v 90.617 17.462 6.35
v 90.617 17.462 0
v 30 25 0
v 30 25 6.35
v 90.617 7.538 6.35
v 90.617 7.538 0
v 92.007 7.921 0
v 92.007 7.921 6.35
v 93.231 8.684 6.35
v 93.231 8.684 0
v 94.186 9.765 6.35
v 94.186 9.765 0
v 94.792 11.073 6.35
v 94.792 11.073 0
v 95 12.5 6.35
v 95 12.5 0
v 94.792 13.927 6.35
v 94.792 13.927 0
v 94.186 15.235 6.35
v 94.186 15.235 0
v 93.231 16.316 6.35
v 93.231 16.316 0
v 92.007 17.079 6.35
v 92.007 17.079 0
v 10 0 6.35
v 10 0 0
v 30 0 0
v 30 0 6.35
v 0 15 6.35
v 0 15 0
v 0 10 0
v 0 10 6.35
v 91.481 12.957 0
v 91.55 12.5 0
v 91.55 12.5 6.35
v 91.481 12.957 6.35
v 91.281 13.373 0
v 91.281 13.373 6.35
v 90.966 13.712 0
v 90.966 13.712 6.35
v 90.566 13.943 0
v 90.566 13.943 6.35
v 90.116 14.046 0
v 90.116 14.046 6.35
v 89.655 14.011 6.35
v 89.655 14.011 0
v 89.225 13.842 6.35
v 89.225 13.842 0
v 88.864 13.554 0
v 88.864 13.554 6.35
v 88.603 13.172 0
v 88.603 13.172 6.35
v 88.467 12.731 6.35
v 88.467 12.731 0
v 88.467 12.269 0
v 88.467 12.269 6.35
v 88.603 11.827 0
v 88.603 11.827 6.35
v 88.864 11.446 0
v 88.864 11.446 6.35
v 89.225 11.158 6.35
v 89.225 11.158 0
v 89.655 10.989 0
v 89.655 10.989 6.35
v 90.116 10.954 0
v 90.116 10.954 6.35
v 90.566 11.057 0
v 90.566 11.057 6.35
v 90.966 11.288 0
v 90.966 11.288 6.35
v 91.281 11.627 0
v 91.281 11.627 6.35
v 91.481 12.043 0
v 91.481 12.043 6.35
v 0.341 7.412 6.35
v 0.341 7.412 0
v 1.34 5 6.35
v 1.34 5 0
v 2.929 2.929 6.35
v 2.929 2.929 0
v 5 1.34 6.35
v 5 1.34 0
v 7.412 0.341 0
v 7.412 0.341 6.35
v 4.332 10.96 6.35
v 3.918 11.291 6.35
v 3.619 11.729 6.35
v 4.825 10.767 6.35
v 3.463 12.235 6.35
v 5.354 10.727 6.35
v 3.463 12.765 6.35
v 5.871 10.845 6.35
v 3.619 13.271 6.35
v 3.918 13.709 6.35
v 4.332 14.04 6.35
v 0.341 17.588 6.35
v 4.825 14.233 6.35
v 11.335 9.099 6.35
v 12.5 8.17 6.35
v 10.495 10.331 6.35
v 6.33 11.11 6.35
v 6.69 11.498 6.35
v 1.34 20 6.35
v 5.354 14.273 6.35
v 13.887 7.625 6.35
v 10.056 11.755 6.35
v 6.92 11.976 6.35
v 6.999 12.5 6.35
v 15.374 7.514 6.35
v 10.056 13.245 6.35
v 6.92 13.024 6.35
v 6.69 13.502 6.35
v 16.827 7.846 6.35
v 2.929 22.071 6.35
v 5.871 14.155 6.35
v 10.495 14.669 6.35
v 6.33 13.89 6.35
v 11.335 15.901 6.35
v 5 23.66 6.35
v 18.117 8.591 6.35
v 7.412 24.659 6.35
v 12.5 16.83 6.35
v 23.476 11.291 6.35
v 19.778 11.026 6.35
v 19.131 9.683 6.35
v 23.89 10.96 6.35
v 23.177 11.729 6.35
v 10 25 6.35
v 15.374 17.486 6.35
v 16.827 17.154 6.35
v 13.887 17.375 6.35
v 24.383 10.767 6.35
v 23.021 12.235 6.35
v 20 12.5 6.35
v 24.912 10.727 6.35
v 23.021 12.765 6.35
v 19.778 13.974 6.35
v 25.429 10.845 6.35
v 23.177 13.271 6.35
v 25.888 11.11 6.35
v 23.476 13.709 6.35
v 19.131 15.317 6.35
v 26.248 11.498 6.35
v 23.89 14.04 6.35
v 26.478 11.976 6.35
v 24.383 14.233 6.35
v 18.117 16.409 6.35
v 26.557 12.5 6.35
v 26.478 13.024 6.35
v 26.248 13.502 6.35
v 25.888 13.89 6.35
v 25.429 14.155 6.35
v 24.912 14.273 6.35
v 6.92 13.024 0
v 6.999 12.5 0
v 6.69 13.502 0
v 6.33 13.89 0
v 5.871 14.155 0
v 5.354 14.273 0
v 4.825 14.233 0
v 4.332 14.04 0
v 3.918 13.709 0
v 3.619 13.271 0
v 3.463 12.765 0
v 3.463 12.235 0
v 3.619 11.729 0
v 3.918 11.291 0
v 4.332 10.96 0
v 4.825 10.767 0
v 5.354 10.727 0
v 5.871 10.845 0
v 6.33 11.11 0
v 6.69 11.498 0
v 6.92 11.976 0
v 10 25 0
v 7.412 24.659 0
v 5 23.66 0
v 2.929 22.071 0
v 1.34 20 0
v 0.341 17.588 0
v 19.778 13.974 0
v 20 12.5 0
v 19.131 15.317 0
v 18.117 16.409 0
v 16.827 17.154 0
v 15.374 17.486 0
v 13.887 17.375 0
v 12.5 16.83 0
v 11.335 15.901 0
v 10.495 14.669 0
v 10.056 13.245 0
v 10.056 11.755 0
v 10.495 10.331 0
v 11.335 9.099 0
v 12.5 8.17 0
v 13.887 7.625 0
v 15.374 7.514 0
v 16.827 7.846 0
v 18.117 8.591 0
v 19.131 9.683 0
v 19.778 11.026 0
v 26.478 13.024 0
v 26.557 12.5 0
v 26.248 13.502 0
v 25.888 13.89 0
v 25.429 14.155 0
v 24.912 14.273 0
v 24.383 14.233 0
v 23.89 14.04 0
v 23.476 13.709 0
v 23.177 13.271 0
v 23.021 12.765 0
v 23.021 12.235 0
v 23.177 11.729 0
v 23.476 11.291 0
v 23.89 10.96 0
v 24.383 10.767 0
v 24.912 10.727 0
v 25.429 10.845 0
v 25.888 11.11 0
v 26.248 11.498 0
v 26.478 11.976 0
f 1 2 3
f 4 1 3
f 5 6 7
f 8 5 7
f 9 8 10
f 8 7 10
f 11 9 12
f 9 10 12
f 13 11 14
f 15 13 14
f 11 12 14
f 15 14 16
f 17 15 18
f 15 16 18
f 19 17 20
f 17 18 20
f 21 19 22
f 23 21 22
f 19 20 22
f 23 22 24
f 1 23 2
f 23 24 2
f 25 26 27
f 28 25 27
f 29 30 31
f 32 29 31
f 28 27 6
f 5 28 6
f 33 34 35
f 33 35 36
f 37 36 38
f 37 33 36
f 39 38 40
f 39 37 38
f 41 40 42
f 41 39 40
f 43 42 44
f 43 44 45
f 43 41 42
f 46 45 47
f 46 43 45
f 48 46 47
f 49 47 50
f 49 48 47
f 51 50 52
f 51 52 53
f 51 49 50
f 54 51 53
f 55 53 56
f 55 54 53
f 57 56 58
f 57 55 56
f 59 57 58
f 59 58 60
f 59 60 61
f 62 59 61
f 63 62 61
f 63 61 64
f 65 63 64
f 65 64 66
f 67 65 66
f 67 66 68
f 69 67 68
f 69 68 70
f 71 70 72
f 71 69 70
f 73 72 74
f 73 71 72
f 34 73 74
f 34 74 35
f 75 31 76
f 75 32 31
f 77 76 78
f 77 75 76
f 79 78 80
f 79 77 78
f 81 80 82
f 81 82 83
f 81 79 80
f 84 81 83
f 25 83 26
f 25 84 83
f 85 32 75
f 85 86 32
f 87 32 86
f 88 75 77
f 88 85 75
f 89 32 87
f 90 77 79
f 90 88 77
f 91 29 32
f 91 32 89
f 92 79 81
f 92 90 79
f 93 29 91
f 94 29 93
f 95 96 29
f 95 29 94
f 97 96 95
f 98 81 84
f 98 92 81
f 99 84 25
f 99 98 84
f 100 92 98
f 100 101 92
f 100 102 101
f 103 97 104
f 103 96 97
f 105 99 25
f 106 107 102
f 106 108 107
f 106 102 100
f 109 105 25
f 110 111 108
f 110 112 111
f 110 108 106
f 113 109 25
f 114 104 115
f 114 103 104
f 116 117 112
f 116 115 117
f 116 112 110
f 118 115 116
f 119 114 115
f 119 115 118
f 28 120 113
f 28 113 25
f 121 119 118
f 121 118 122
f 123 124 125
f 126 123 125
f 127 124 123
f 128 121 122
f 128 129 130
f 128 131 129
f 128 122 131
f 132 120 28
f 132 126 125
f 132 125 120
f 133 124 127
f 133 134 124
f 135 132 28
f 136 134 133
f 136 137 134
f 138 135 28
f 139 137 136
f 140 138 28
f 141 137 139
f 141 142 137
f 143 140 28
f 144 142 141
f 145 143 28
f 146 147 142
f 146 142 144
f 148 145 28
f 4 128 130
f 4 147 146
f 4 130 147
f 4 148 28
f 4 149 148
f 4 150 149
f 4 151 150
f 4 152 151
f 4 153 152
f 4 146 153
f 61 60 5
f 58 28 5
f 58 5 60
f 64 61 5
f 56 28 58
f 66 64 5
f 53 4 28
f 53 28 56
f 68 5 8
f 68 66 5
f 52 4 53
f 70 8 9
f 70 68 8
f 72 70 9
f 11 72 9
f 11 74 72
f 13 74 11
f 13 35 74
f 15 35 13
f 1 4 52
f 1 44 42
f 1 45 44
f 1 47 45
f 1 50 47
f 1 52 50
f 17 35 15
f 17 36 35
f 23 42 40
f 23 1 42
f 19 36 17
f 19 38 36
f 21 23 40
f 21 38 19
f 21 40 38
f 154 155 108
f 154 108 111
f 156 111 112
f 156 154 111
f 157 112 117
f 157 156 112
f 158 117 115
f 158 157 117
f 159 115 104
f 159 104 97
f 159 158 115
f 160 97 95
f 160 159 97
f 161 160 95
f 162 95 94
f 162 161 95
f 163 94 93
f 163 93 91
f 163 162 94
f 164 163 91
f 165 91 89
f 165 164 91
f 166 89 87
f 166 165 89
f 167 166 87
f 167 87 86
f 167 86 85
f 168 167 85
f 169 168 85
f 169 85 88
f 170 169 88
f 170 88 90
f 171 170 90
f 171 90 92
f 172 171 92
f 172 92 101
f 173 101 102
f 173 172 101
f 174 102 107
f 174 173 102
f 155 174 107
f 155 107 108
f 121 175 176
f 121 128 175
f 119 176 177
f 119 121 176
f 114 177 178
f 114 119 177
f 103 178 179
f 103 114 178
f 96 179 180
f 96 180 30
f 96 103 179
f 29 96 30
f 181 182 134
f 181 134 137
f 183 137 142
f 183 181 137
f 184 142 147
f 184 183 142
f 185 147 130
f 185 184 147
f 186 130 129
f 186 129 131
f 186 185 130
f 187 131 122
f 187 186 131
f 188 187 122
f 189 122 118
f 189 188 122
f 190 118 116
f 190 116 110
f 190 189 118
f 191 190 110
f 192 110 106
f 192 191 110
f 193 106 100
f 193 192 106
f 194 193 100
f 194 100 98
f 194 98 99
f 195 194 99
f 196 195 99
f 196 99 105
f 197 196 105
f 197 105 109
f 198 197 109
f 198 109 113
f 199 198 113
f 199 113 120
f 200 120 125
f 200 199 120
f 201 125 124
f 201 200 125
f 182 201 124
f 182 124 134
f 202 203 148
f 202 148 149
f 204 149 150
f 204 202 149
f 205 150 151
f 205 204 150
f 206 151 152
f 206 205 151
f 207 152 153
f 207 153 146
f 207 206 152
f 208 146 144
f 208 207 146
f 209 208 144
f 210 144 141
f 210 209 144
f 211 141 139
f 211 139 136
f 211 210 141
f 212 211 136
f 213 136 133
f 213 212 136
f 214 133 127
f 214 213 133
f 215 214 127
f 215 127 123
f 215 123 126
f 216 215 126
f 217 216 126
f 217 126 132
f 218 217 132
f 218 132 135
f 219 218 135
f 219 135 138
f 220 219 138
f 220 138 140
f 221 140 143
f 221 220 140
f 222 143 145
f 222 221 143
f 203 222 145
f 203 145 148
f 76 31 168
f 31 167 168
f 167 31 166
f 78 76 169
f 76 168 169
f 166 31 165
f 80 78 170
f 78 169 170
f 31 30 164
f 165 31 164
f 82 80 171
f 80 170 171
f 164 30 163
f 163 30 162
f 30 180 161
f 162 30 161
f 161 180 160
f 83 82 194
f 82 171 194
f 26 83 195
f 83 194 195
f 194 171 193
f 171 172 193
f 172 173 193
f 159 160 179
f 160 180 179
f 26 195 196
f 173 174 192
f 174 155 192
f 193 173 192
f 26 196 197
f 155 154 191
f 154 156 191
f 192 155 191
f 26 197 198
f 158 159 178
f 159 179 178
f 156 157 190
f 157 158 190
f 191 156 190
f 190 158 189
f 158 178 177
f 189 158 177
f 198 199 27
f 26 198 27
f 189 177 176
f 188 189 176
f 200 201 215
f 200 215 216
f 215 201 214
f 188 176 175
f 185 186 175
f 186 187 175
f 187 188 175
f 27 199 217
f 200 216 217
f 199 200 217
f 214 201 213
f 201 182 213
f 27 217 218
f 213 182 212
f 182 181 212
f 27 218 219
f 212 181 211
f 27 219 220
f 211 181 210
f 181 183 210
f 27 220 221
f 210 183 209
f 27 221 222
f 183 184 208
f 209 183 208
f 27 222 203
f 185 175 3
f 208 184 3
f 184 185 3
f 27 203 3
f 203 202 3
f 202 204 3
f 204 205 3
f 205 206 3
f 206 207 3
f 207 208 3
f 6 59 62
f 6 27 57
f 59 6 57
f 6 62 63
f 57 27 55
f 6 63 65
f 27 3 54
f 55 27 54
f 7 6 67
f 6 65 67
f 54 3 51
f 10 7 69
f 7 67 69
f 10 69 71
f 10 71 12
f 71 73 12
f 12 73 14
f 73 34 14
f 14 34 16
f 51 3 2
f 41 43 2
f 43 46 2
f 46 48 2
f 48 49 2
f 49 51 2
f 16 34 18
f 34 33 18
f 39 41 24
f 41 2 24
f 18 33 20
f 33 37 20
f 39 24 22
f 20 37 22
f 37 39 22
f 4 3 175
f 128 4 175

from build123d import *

# Parameters (mm, degrees)
SKETCH1_R           = 1.778
SKETCH1_R_2         = 1.55
SKETCH1_R_3         = 5
BOSS_EXTRUDE1_DEPTH = 6.35
FILLET1_R           = 10


with BuildPart() as part:
    # Sketch1 → Boss-Extrude1 (new body)
    with BuildSketch(Plane.XY):
        with BuildLine():
            Line((90.617041925, 17.461725961), (30, 25))
            Line((30, 25), (0, 25))
            Line((0, 25), (0, 0))
            Line((0, 0), (30, 0))
            Line((30, 0), (90.617033237, 7.538165184))
            ThreePointArc((90.617033237, 7.538165184), (95, 12.499941736), (90.617041925, 17.461725961))
        make_face()
        with Locations((24.779, 12.499946113)):
            Circle(SKETCH1_R, mode=Mode.SUBTRACT)
        with Locations((5.221, 12.499946113)):
            Circle(SKETCH1_R, mode=Mode.SUBTRACT)
        with Locations((90, 12.499946113)):
            Circle(SKETCH1_R_2, mode=Mode.SUBTRACT)
        with Locations((15, 12.499946113)):
            Circle(SKETCH1_R_3, mode=Mode.SUBTRACT)
    extrude(amount=BOSS_EXTRUDE1_DEPTH)

    # Fillet1
    fillet1_edges = [part.edges().sort_by_distance(p)[0] for p in [
        (0, 0, 3.175),
        (0, 25, 3.175),
    ]]
    fillet(fillet1_edges, radius=FILLET1_R)


solid = part.part
